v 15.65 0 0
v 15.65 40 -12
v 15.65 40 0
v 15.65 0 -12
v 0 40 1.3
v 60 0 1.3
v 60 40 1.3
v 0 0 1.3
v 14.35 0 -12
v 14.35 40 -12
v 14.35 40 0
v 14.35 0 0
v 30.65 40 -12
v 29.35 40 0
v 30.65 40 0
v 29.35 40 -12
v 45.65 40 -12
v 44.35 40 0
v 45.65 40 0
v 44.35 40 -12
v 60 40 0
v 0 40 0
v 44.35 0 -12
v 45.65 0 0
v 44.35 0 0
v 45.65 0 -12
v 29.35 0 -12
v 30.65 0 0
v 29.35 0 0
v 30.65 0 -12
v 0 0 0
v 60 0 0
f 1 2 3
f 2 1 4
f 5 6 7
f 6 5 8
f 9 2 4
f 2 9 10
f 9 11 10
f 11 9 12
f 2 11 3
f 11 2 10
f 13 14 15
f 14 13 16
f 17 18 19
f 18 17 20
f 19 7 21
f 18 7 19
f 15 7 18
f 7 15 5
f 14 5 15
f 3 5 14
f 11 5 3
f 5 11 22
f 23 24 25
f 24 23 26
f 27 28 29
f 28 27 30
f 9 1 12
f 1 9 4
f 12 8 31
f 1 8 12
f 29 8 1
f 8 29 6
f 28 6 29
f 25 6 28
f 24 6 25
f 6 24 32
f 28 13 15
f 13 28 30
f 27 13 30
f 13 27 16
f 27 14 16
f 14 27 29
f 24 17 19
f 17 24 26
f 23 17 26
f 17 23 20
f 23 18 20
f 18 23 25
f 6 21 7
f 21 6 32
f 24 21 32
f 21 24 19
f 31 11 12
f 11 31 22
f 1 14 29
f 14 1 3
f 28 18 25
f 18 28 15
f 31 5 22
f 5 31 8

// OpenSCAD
$fn = 32;

// ----------------------------------------------------------------------
// Ribbed panel: 1.3 mm panel
// ----------------------------------------------------------------------

// --- parameters (mm) ---
panel_l = 60;             // panel length, X
panel_w = 40;             // panel width, Y
panel_t = 1.3;            // panel thickness, Z
rib_t = 1.3;              // rib thickness
rib_h = 12;               // rib height below the panel
ribs = 3;                 // number of ribs

total_h = panel_t + rib_h;  // overall height

union() {
  cube([panel_l, panel_w, panel_t]);
  for (i = [1 : ribs])
    translate([i * panel_l / (ribs + 1) - rib_t / 2, 0, -rib_h])
      cube([rib_t, panel_w, rib_h + panel_t]);
}
